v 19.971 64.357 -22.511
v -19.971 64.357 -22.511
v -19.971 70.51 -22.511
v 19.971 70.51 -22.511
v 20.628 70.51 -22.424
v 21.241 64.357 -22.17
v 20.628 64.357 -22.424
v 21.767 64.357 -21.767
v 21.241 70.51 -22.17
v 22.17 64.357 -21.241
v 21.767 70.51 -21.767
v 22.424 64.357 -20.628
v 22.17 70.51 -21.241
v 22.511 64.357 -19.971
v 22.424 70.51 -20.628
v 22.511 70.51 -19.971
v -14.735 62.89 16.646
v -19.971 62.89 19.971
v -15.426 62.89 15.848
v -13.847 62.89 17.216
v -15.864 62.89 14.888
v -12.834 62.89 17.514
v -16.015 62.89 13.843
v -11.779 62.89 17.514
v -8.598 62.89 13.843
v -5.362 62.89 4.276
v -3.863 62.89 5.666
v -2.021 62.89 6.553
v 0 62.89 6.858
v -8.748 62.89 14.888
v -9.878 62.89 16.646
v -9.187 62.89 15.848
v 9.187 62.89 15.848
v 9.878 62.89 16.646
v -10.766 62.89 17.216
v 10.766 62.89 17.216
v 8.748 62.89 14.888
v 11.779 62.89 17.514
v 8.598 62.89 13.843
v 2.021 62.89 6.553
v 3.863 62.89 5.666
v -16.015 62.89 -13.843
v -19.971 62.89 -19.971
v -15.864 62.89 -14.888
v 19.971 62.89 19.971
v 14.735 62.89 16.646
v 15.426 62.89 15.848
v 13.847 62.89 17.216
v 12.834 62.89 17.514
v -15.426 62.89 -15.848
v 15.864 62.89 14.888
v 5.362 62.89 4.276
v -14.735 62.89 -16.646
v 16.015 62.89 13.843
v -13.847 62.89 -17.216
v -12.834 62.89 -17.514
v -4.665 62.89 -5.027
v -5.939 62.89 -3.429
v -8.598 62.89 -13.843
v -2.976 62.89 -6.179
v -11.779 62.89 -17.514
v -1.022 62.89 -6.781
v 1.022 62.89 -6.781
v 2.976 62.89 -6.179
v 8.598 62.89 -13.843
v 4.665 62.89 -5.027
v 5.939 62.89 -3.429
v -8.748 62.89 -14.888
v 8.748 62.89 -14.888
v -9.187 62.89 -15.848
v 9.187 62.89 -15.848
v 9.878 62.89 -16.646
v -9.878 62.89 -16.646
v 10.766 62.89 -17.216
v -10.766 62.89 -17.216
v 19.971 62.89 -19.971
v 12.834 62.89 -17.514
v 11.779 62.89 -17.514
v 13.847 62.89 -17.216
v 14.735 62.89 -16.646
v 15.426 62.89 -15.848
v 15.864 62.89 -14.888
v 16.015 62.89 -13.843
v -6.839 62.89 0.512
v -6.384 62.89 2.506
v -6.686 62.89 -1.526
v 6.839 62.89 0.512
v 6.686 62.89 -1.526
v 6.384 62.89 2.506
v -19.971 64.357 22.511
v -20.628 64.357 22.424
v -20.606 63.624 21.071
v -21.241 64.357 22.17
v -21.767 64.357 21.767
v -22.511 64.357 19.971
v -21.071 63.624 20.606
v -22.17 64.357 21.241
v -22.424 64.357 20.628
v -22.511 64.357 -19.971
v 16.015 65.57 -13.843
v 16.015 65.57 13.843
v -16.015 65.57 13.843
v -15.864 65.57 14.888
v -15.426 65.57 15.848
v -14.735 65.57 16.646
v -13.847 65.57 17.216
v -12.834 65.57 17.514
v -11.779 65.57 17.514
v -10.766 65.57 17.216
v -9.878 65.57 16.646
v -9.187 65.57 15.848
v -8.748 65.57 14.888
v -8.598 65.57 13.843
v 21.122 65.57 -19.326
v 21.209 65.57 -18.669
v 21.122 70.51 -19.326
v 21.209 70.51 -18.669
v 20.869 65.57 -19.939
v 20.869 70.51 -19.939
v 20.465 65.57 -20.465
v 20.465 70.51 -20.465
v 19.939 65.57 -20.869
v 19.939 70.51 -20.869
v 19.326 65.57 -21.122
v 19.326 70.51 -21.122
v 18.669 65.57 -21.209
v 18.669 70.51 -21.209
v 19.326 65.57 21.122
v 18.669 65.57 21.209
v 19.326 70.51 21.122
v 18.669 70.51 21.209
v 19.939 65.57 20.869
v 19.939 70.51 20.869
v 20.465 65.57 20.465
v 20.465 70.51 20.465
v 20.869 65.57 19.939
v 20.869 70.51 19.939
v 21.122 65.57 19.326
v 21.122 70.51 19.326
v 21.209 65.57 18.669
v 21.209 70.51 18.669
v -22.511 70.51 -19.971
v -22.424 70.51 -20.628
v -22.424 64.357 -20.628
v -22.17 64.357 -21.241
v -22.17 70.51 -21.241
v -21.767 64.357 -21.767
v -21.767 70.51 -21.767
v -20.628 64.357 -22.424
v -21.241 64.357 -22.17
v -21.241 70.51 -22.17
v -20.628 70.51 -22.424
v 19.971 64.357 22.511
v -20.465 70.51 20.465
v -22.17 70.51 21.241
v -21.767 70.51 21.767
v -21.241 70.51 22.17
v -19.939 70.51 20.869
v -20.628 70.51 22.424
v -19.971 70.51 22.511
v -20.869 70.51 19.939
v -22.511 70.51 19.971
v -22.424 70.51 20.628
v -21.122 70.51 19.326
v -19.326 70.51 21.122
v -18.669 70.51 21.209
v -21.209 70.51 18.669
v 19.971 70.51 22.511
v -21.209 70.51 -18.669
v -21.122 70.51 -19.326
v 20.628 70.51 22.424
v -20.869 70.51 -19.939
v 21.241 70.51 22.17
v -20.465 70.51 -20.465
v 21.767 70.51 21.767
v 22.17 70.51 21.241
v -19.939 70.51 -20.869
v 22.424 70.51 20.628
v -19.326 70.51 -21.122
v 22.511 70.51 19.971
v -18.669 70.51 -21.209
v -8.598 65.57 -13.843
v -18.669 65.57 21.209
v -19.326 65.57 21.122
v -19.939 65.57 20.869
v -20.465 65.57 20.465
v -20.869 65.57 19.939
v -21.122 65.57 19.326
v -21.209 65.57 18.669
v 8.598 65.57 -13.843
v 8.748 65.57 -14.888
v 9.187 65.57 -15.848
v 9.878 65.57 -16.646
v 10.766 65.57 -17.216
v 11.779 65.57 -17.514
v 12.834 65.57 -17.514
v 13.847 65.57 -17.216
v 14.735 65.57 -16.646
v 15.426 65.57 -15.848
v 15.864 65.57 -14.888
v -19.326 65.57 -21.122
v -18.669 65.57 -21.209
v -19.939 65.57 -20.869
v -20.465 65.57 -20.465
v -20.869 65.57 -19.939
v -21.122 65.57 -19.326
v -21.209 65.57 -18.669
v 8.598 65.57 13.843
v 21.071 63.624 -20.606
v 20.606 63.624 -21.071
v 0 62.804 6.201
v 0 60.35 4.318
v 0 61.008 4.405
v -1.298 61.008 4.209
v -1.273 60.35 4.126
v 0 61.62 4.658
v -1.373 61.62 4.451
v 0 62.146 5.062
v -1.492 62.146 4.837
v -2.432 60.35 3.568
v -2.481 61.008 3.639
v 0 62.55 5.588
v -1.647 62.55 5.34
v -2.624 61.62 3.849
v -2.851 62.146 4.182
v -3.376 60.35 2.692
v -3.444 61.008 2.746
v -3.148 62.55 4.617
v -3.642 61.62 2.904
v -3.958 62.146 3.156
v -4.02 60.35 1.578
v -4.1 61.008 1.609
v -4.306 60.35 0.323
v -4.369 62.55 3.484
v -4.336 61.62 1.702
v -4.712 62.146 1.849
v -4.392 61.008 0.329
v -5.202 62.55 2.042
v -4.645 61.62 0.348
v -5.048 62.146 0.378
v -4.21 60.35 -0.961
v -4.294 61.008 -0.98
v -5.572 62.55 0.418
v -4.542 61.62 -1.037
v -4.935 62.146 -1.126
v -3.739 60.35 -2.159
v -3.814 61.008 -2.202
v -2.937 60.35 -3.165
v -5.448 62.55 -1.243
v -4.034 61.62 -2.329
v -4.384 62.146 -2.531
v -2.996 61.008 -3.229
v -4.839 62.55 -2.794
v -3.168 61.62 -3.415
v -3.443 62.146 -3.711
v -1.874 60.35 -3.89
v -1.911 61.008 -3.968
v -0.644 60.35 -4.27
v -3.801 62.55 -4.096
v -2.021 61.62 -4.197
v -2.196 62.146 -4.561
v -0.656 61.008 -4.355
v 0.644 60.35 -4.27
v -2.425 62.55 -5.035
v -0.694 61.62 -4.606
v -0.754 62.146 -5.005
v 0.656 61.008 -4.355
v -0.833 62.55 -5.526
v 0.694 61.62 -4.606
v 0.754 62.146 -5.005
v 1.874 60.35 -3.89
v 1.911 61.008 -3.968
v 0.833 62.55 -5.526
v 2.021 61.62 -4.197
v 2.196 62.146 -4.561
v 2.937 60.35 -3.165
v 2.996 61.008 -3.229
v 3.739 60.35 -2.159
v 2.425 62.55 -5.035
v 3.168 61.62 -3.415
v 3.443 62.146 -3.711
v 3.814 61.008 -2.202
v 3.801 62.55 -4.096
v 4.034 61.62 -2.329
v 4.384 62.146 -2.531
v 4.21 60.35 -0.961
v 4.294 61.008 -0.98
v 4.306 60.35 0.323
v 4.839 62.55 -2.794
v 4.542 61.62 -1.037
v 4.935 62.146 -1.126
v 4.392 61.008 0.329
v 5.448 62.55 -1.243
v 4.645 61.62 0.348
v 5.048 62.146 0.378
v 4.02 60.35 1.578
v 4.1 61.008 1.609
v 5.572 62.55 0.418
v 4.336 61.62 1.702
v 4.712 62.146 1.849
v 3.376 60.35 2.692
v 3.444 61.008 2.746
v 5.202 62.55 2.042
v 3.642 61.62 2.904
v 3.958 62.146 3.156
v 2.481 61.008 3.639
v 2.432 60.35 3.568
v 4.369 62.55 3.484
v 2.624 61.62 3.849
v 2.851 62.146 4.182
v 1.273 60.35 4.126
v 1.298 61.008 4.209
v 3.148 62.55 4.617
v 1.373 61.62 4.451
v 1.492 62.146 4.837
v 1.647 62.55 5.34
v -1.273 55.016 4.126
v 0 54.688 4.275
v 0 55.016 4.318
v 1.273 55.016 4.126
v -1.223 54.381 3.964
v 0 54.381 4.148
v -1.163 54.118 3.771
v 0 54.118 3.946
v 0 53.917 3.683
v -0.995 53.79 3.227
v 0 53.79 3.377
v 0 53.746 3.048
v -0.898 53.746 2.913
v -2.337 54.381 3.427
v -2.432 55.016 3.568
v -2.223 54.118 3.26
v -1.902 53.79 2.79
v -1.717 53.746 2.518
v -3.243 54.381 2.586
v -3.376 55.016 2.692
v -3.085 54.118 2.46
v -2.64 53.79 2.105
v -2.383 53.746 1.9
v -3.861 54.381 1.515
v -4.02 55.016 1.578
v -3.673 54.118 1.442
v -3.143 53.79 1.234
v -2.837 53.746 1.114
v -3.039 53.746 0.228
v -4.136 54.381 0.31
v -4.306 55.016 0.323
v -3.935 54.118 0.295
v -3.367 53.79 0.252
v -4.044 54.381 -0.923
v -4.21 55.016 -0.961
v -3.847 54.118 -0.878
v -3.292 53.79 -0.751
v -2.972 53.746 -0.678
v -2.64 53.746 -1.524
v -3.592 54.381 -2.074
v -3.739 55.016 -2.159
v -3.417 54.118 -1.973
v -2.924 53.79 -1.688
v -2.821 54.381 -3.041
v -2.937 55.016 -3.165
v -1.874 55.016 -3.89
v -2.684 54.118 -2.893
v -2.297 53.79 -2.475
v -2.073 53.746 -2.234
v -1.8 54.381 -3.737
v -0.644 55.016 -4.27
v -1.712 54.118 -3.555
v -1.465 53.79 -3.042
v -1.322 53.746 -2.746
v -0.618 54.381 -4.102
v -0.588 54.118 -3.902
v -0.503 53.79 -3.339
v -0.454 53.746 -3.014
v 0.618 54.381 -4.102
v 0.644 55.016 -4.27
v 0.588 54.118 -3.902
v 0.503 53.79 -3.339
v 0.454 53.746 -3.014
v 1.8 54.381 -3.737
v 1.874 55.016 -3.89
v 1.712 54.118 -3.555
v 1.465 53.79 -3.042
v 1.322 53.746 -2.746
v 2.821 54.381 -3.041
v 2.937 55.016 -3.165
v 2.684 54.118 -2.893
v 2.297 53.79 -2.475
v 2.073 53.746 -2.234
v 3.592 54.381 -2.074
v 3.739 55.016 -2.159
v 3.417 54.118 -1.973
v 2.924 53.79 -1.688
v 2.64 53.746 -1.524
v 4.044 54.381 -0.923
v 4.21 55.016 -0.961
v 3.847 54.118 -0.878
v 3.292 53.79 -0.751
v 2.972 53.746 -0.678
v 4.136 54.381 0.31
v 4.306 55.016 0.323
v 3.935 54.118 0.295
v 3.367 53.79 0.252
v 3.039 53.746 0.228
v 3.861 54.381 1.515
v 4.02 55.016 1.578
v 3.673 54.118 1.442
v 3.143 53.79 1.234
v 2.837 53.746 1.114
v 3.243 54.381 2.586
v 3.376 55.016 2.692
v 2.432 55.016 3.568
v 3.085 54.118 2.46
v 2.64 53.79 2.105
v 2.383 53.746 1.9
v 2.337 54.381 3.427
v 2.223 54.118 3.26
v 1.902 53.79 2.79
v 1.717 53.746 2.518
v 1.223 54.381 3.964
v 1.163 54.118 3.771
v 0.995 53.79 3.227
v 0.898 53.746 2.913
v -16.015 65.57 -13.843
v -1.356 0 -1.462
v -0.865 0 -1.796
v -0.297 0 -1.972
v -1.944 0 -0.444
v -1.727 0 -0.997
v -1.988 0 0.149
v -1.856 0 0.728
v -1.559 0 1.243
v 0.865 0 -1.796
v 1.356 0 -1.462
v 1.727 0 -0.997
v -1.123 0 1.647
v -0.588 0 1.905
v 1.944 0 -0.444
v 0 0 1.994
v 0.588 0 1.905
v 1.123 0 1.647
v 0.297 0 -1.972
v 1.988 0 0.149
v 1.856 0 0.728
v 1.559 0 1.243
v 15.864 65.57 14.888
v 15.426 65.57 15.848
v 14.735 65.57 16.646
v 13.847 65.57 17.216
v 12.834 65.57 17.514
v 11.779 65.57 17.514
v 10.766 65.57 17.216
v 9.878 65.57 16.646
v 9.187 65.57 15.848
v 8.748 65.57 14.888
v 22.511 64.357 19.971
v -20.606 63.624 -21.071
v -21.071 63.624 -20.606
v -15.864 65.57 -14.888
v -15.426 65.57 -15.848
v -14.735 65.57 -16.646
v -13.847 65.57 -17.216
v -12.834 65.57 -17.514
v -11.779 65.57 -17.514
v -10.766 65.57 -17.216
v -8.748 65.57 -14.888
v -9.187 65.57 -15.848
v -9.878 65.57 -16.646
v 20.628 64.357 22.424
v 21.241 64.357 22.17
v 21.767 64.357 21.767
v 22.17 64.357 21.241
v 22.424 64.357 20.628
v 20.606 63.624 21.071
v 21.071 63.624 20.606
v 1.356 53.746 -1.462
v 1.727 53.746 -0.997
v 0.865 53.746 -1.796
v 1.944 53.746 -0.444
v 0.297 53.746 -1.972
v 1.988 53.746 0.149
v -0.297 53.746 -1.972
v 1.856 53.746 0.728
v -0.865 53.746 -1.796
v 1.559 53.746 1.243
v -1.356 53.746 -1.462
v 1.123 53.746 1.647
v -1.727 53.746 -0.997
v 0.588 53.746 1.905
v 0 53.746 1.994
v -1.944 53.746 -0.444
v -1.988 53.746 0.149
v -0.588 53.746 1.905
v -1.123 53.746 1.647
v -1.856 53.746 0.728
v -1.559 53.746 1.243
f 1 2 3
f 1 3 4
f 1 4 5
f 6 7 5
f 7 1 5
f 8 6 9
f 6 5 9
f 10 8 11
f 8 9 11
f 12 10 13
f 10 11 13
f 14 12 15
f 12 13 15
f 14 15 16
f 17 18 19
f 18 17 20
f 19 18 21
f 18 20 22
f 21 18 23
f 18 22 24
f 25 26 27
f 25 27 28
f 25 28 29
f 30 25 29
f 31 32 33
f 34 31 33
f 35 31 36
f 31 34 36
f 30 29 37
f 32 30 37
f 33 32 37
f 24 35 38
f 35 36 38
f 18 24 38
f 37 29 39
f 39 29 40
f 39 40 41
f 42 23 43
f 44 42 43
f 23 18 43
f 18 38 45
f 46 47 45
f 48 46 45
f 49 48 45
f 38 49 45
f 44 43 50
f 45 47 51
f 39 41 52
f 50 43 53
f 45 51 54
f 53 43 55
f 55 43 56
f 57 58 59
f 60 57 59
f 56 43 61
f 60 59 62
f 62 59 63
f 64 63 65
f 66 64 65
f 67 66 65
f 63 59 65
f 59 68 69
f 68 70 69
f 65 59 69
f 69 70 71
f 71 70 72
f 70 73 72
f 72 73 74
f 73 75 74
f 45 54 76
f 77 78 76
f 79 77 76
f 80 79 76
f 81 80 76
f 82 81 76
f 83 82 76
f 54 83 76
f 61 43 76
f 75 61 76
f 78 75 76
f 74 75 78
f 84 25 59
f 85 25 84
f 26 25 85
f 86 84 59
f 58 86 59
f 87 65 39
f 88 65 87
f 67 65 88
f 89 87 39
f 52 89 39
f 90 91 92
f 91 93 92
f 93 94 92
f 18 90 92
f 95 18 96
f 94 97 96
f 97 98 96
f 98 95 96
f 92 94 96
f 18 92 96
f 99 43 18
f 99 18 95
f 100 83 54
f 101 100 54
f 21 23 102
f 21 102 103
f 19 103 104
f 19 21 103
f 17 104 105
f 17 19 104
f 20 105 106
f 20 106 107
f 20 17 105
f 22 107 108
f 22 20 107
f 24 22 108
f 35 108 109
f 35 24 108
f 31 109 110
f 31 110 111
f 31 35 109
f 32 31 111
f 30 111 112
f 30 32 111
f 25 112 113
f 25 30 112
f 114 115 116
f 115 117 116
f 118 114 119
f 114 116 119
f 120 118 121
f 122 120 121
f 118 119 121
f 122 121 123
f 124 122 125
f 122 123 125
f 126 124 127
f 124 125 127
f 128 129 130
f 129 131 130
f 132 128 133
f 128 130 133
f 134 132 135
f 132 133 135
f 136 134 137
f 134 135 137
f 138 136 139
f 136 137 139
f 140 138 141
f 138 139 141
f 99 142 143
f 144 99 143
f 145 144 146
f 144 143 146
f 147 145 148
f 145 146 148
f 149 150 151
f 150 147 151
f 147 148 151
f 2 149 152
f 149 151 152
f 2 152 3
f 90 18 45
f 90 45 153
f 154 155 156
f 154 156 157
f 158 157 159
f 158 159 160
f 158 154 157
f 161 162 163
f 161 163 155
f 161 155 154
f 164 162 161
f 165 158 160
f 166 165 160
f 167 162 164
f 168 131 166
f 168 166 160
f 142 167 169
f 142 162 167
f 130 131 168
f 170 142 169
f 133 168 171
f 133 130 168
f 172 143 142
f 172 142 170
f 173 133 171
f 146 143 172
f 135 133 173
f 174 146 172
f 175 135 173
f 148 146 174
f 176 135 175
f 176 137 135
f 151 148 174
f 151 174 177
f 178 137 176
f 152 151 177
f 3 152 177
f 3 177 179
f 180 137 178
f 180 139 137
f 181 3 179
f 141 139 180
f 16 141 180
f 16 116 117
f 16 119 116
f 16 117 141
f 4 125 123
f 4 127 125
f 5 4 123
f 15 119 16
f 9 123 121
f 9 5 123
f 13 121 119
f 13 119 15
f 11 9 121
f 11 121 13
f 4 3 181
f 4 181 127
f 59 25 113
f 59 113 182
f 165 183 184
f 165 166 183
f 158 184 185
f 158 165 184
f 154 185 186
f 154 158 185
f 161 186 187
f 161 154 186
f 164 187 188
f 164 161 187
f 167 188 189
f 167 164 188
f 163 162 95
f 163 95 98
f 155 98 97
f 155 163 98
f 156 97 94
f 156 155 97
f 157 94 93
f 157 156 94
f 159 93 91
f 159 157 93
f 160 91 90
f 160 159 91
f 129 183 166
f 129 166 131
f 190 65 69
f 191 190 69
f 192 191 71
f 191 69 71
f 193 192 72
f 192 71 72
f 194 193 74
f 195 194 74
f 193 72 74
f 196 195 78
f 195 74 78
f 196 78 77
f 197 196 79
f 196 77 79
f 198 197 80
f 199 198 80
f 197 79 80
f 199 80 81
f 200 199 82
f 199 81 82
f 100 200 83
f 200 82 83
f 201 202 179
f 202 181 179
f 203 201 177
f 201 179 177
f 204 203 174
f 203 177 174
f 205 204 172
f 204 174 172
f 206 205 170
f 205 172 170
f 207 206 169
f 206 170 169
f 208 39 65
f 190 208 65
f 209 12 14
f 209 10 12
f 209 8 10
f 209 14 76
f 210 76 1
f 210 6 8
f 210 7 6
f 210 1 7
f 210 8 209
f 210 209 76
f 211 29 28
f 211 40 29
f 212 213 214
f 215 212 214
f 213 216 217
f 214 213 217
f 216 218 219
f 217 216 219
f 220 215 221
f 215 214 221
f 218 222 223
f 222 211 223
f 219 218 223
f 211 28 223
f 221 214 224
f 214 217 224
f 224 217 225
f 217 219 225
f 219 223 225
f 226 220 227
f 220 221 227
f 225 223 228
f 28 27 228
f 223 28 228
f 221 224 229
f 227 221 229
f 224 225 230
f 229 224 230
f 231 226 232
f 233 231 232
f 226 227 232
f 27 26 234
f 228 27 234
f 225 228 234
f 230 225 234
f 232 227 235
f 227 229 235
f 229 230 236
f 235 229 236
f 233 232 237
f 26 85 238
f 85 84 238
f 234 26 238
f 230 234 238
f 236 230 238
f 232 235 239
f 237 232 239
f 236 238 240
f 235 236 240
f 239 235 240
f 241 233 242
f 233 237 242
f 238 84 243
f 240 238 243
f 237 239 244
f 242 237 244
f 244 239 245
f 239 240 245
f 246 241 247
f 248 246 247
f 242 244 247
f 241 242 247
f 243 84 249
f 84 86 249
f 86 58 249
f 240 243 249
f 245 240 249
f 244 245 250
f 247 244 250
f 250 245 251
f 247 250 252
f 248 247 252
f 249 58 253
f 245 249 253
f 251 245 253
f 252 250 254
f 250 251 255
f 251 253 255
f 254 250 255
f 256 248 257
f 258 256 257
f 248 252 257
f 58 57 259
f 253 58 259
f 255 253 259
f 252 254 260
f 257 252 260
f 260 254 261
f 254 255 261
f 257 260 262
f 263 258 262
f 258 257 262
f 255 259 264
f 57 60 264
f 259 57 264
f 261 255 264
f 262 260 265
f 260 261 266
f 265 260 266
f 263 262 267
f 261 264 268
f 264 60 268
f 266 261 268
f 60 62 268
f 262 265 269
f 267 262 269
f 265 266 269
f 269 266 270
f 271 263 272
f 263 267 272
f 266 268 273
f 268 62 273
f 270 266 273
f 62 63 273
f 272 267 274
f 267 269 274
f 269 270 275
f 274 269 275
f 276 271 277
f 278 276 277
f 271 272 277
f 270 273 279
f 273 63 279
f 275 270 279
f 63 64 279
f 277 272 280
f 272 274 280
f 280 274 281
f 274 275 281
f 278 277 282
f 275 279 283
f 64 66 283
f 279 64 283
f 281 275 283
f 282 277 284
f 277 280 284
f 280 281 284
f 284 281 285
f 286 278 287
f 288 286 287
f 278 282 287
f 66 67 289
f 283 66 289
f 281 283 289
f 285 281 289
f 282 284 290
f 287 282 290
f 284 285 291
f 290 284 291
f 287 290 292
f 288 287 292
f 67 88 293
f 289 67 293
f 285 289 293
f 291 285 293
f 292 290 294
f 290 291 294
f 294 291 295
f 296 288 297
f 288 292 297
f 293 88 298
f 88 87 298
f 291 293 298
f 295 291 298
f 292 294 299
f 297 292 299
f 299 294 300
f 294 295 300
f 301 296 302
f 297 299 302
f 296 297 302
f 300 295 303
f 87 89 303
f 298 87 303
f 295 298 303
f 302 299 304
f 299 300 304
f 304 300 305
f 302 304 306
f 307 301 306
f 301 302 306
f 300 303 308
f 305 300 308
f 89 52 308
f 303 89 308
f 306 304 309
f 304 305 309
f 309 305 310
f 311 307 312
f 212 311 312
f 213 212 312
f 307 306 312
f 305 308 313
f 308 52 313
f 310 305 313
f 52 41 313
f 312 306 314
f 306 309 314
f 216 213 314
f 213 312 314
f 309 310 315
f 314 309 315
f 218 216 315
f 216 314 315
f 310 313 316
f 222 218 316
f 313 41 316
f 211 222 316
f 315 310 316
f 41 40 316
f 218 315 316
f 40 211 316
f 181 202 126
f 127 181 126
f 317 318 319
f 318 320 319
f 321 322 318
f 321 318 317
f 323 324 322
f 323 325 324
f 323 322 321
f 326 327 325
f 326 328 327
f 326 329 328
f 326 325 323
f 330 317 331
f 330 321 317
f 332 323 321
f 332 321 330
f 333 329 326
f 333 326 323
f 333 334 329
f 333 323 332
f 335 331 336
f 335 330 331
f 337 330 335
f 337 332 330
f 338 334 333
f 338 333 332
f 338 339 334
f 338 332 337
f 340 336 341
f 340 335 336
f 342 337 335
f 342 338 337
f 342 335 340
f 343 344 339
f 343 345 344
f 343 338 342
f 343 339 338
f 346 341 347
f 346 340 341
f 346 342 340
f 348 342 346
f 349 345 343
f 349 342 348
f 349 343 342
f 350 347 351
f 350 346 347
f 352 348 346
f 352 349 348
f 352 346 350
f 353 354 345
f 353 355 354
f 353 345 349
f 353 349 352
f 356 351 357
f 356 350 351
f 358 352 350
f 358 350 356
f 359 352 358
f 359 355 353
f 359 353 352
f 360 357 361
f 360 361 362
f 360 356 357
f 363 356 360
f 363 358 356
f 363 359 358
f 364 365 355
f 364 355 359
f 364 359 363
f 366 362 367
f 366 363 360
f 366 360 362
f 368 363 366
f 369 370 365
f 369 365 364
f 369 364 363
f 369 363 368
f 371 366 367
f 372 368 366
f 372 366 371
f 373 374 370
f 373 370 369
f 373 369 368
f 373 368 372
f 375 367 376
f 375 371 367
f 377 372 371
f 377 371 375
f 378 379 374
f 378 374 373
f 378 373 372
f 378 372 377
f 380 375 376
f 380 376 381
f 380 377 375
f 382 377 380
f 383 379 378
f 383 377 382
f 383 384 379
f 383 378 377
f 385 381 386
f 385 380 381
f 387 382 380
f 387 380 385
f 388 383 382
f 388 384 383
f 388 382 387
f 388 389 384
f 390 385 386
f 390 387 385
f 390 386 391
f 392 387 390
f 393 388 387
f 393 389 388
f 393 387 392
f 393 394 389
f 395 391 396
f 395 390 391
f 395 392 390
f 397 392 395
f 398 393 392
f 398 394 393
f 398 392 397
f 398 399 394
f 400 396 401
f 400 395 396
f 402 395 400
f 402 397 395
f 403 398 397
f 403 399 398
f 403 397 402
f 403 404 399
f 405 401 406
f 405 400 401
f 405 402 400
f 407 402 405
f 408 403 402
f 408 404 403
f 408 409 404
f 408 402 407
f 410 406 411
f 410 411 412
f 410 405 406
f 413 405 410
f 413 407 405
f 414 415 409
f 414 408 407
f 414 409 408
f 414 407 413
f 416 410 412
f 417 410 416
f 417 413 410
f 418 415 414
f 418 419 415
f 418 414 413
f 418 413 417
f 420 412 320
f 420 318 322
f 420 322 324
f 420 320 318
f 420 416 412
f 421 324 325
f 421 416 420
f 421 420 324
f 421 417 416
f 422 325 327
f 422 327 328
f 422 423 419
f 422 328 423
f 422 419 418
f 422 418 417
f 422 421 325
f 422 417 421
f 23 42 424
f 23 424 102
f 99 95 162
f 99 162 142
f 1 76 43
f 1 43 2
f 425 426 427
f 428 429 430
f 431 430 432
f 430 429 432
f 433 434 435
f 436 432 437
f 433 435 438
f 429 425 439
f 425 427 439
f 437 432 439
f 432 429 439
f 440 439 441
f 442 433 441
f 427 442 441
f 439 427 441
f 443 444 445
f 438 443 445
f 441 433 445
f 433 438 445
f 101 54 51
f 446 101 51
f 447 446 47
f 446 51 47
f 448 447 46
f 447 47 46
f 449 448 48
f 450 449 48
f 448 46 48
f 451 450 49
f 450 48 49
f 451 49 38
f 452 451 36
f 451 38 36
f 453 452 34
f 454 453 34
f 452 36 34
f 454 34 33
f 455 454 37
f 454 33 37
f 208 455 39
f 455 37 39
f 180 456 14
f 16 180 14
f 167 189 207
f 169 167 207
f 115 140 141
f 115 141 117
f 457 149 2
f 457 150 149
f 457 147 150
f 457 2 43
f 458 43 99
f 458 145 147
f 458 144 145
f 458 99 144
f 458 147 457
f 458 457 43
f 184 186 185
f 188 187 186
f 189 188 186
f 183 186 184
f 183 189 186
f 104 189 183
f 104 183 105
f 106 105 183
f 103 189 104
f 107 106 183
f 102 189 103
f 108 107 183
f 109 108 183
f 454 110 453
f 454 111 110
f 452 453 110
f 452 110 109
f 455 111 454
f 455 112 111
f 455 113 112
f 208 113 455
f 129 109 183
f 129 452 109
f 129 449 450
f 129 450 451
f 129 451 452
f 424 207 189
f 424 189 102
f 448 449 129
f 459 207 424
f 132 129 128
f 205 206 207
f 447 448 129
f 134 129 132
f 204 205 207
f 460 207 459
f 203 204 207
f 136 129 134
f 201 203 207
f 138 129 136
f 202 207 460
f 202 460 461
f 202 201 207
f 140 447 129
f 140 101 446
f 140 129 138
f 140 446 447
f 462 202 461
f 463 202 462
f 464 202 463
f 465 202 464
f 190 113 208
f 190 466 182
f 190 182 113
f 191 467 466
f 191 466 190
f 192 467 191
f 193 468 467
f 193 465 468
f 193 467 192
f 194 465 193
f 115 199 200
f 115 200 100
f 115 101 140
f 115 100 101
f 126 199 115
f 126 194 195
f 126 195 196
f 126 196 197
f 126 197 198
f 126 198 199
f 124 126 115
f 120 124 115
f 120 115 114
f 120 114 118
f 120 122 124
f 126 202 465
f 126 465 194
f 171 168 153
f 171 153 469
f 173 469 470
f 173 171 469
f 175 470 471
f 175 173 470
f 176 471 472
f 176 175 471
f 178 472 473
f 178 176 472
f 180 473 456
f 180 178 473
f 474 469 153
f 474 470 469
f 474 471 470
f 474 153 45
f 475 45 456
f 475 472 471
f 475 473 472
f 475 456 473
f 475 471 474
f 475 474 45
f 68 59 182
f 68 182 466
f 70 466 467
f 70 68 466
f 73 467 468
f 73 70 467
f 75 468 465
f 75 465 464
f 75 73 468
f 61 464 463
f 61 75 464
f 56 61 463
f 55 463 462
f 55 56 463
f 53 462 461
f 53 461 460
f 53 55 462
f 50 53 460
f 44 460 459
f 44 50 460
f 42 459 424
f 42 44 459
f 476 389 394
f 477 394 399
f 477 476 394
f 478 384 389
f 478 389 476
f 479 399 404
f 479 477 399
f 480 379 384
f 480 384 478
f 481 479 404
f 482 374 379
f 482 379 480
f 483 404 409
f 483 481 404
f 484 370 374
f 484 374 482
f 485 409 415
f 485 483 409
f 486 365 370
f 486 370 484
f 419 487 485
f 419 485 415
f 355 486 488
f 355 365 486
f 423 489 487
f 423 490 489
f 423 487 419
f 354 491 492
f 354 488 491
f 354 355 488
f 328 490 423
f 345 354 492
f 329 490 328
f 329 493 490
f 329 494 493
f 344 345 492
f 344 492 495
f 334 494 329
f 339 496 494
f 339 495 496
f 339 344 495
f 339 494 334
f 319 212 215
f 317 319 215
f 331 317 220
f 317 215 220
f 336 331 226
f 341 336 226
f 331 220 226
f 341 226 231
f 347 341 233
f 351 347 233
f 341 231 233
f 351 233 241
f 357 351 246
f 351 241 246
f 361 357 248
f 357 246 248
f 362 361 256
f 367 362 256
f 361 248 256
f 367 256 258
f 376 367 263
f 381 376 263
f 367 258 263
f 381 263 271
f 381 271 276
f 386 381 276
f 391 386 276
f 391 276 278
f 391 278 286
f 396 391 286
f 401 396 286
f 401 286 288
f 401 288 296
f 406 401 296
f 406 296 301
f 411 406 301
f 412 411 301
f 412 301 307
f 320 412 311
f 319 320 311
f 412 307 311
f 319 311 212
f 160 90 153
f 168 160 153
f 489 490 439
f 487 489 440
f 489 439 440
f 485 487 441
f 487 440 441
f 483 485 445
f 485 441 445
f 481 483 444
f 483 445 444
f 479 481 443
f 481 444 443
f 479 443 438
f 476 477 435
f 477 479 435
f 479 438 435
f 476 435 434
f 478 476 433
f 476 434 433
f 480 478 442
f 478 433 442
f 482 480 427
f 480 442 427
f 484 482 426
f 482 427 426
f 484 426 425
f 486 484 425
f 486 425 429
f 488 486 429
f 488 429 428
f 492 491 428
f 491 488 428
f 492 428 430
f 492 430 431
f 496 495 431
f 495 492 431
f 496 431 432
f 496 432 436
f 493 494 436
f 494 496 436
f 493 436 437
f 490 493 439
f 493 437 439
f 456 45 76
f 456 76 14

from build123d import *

# Parameters (mm, degrees)
SKETCH1_R           = 1.9939
BOSS_EXTRUDE1_DEPTH = 62.8904
SKETCH2_W           = 42.418
SKETCH2_H           = 42.418
SKETCH2_R           = 1.9939
BOSS_EXTRUDE2_DEPTH = 2.6797
SKETCH2_3_W         = 45.0215
SKETCH2_3_H         = 45.0215
SKETCH2_3_W_2       = 42.418
SKETCH2_3_H_2       = 42.418
BOSS_EXTRUDE3_DEPTH = 7.62
FILLET1_R           = 2.54
SKETCH3_R           = 4.318
BOSS_EXTRUDE4_DEPTH = 9.144
FILLET2_R           = 2.54
FILLET3_R           = 1.27
CHAMFER1_SIZE       = 2.54
CHAMFER1_SIZE_2     = 1.466469684


with BuildPart() as part:
    # Sketch1 → Boss-Extrude1 (new body)
    with BuildSketch(Plane(origin=(0, 0, 0), x_dir=(1, 0, 0), z_dir=(0, 1, 0))):
        with Locations(Location((0, 0, 0), (0, 0, 270))):
            Circle(SKETCH1_R)
    extrude(amount=BOSS_EXTRUDE1_DEPTH)



with BuildPart() as body_2:
    # Sketch2 → Boss-Extrude2 (new body)
    # profile 1 of 2: a face of its own
    with BuildSketch(Plane(origin=(0, 62.8904, 0), x_dir=(1, 0, 0), z_dir=(0, 1, 0))):
        Rectangle(SKETCH2_W, SKETCH2_H)
        with Locations(Location((0, 0, 0), (0, 0, 270))):
            Circle(SKETCH2_R, mode=Mode.SUBTRACT)
        with BuildLine():
            ThreePointArc((-16.0147, -13.843), (-12.3063, -17.5514), (-8.5979, -13.843))
            Line((-8.5979, -13.843), (-8.5979, 13.843))
            ThreePointArc((-8.5979, 13.843), (-12.3063, 17.5514), (-16.0147, 13.843))
            Line((-16.0147, 13.843), (-16.0147, -13.843))
        make_face(mode=Mode.SUBTRACT)
        with BuildLine():
            Line((16.0147, 13.843), (16.0147, -13.843))
            ThreePointArc((16.0147, -13.843), (12.3063, -17.5514), (8.5979, -13.843))
            Line((8.5979, -13.843), (8.5979, 13.843))
            ThreePointArc((8.5979, 13.843), (12.3063, 17.5514), (16.0147, 13.843))
        make_face(mode=Mode.SUBTRACT)
    # profile 2 of 2: a face of its own
    with BuildSketch(Plane(origin=(0, 62.8904, 0), x_dir=(1, 0, 0), z_dir=(0, 1, 0))):
        with Locations(Location((0, 0, 0), (0, 0, 270))):
            Circle(SKETCH2_R)
    extrude(amount=BOSS_EXTRUDE2_DEPTH)


with BuildPart() as part_1:
    add(part.part)

    add(body_2.part)  # Boss-Extrude3 merges body 2
    # Sketch2<3> → Boss-Extrude3 (add)
    with BuildSketch(Plane(origin=(0, 62.8904, 0), x_dir=(1, 0, 0), z_dir=(0, 1, 0))):
        Rectangle(SKETCH2_3_W, SKETCH2_3_H)
        Rectangle(SKETCH2_3_W_2, SKETCH2_3_H_2, mode=Mode.SUBTRACT)
    extrude(amount=BOSS_EXTRUDE3_DEPTH)

    # Fillet1
    fillet1_edges = [part_1.edges().sort_by_distance(p)[0] for p in [
        (21.209, 68.04025, 21.209),
        (-21.209, 68.04025, 21.209),
        (-21.209, 68.04025, -21.209),
        (-22.51075, 66.7004, 22.51075),
        (22.51075, 66.7004, 22.51075),
        (22.51075, 66.7004, -22.51075),
        (-22.51075, 66.7004, -22.51075),
        (21.209, 68.04025, -21.209),
    ]]
    fillet(fillet1_edges, radius=FILLET1_R)

    # Sketch3 → Boss-Extrude4 (add)
    with BuildSketch(Plane.XZ.offset(-62.8904)):
        with Locations(Location((0, 0, 0), (0, 0, 90))):
            Circle(SKETCH3_R)
    extrude(amount=BOSS_EXTRUDE4_DEPTH)

    # Fillet2
    fillet2_edges = [part_1.edges().sort_by_distance(p)[0] for p in [
        (0, 62.8904, -4.318),
    ]]
    fillet(fillet2_edges, radius=FILLET2_R)

    # Fillet3
    fillet3_edges = [part_1.edges().sort_by_distance(p)[0] for p in [
        (0, 53.7464, -4.318),
    ]]
    fillet(fillet3_edges, radius=FILLET3_R)

    # Chamfer1
    # the kernel refuses this chamfer: 2.54, 1.466469684 mm, written as the material it takes off along each edge
    with BuildSketch(Plane(origin=(-19.97075, 62.8904, 22.51075), x_dir=(0, 0, -1), z_dir=(1, 0, 0)), Plane(origin=(-22.51075, 62.8904, -19.97075), x_dir=(1, 0, 0), z_dir=(0, 0, 1)), Plane(origin=(19.97075, 62.8904, -22.51075), x_dir=(0, 0, 1), z_dir=(-1, 0, 0)), Plane(origin=(22.51075, 62.8904, 19.97075), x_dir=(-1, 0, 0), z_dir=(0, 0, -1))) as chamfer1_piece_1:
        Polygon((CHAMFER1_SIZE, 0), (0, CHAMFER1_SIZE_2), (0, 0), align=None)
    extrude(amount=39.9415, mode=Mode.SUBTRACT)
    with BuildSketch(Plane(origin=(-19.97075, 62.8904, -19.97075), x_dir=(0, 0, -1), z_dir=(1, 0, 0))) as chamfer1_piece_2:
        Polygon((2.54 - CHAMFER1_SIZE, 0), (2.54, CHAMFER1_SIZE_2), (2.54, 0), align=None)
    revolve(axis=Axis((-19.97075, 62.8904, -19.97075), (0, 1, 0)), revolution_arc=90, mode=Mode.SUBTRACT)
    with BuildSketch(Plane(origin=(19.97075, 62.8904, 19.97075), x_dir=(0, 0, 1), z_dir=(-1, 0, 0))) as chamfer1_piece_3:
        Polygon((2.54 - CHAMFER1_SIZE, 0), (2.54, CHAMFER1_SIZE_2), (2.54, 0), align=None)
    revolve(axis=Axis((19.97075, 62.8904, 19.97075), (0, 1, 0)), revolution_arc=90, mode=Mode.SUBTRACT)
    with BuildSketch(Plane(origin=(19.97075, 62.8904, -19.97075), x_dir=(1, 0, 0), z_dir=(0, 0, 1))) as chamfer1_piece_4:
        Polygon((2.54 - CHAMFER1_SIZE, 0), (2.54, CHAMFER1_SIZE_2), (2.54, 0), align=None)
    revolve(axis=Axis((19.97075, 62.8904, -19.97075), (0, 1, 0)), revolution_arc=90, mode=Mode.SUBTRACT)
    with BuildSketch(Plane(origin=(-19.97075, 62.8904, 19.97075), x_dir=(0, 0, 1), z_dir=(1, 0, 0))) as chamfer1_piece_5:
        Polygon((2.54 - CHAMFER1_SIZE, 0), (2.54, -CHAMFER1_SIZE_2), (2.54, 0), align=None)
    revolve(axis=Axis((-19.97075, 62.8904, 19.97075), (0, -1, 0)), revolution_arc=90, mode=Mode.SUBTRACT)


solid = part_1.part
